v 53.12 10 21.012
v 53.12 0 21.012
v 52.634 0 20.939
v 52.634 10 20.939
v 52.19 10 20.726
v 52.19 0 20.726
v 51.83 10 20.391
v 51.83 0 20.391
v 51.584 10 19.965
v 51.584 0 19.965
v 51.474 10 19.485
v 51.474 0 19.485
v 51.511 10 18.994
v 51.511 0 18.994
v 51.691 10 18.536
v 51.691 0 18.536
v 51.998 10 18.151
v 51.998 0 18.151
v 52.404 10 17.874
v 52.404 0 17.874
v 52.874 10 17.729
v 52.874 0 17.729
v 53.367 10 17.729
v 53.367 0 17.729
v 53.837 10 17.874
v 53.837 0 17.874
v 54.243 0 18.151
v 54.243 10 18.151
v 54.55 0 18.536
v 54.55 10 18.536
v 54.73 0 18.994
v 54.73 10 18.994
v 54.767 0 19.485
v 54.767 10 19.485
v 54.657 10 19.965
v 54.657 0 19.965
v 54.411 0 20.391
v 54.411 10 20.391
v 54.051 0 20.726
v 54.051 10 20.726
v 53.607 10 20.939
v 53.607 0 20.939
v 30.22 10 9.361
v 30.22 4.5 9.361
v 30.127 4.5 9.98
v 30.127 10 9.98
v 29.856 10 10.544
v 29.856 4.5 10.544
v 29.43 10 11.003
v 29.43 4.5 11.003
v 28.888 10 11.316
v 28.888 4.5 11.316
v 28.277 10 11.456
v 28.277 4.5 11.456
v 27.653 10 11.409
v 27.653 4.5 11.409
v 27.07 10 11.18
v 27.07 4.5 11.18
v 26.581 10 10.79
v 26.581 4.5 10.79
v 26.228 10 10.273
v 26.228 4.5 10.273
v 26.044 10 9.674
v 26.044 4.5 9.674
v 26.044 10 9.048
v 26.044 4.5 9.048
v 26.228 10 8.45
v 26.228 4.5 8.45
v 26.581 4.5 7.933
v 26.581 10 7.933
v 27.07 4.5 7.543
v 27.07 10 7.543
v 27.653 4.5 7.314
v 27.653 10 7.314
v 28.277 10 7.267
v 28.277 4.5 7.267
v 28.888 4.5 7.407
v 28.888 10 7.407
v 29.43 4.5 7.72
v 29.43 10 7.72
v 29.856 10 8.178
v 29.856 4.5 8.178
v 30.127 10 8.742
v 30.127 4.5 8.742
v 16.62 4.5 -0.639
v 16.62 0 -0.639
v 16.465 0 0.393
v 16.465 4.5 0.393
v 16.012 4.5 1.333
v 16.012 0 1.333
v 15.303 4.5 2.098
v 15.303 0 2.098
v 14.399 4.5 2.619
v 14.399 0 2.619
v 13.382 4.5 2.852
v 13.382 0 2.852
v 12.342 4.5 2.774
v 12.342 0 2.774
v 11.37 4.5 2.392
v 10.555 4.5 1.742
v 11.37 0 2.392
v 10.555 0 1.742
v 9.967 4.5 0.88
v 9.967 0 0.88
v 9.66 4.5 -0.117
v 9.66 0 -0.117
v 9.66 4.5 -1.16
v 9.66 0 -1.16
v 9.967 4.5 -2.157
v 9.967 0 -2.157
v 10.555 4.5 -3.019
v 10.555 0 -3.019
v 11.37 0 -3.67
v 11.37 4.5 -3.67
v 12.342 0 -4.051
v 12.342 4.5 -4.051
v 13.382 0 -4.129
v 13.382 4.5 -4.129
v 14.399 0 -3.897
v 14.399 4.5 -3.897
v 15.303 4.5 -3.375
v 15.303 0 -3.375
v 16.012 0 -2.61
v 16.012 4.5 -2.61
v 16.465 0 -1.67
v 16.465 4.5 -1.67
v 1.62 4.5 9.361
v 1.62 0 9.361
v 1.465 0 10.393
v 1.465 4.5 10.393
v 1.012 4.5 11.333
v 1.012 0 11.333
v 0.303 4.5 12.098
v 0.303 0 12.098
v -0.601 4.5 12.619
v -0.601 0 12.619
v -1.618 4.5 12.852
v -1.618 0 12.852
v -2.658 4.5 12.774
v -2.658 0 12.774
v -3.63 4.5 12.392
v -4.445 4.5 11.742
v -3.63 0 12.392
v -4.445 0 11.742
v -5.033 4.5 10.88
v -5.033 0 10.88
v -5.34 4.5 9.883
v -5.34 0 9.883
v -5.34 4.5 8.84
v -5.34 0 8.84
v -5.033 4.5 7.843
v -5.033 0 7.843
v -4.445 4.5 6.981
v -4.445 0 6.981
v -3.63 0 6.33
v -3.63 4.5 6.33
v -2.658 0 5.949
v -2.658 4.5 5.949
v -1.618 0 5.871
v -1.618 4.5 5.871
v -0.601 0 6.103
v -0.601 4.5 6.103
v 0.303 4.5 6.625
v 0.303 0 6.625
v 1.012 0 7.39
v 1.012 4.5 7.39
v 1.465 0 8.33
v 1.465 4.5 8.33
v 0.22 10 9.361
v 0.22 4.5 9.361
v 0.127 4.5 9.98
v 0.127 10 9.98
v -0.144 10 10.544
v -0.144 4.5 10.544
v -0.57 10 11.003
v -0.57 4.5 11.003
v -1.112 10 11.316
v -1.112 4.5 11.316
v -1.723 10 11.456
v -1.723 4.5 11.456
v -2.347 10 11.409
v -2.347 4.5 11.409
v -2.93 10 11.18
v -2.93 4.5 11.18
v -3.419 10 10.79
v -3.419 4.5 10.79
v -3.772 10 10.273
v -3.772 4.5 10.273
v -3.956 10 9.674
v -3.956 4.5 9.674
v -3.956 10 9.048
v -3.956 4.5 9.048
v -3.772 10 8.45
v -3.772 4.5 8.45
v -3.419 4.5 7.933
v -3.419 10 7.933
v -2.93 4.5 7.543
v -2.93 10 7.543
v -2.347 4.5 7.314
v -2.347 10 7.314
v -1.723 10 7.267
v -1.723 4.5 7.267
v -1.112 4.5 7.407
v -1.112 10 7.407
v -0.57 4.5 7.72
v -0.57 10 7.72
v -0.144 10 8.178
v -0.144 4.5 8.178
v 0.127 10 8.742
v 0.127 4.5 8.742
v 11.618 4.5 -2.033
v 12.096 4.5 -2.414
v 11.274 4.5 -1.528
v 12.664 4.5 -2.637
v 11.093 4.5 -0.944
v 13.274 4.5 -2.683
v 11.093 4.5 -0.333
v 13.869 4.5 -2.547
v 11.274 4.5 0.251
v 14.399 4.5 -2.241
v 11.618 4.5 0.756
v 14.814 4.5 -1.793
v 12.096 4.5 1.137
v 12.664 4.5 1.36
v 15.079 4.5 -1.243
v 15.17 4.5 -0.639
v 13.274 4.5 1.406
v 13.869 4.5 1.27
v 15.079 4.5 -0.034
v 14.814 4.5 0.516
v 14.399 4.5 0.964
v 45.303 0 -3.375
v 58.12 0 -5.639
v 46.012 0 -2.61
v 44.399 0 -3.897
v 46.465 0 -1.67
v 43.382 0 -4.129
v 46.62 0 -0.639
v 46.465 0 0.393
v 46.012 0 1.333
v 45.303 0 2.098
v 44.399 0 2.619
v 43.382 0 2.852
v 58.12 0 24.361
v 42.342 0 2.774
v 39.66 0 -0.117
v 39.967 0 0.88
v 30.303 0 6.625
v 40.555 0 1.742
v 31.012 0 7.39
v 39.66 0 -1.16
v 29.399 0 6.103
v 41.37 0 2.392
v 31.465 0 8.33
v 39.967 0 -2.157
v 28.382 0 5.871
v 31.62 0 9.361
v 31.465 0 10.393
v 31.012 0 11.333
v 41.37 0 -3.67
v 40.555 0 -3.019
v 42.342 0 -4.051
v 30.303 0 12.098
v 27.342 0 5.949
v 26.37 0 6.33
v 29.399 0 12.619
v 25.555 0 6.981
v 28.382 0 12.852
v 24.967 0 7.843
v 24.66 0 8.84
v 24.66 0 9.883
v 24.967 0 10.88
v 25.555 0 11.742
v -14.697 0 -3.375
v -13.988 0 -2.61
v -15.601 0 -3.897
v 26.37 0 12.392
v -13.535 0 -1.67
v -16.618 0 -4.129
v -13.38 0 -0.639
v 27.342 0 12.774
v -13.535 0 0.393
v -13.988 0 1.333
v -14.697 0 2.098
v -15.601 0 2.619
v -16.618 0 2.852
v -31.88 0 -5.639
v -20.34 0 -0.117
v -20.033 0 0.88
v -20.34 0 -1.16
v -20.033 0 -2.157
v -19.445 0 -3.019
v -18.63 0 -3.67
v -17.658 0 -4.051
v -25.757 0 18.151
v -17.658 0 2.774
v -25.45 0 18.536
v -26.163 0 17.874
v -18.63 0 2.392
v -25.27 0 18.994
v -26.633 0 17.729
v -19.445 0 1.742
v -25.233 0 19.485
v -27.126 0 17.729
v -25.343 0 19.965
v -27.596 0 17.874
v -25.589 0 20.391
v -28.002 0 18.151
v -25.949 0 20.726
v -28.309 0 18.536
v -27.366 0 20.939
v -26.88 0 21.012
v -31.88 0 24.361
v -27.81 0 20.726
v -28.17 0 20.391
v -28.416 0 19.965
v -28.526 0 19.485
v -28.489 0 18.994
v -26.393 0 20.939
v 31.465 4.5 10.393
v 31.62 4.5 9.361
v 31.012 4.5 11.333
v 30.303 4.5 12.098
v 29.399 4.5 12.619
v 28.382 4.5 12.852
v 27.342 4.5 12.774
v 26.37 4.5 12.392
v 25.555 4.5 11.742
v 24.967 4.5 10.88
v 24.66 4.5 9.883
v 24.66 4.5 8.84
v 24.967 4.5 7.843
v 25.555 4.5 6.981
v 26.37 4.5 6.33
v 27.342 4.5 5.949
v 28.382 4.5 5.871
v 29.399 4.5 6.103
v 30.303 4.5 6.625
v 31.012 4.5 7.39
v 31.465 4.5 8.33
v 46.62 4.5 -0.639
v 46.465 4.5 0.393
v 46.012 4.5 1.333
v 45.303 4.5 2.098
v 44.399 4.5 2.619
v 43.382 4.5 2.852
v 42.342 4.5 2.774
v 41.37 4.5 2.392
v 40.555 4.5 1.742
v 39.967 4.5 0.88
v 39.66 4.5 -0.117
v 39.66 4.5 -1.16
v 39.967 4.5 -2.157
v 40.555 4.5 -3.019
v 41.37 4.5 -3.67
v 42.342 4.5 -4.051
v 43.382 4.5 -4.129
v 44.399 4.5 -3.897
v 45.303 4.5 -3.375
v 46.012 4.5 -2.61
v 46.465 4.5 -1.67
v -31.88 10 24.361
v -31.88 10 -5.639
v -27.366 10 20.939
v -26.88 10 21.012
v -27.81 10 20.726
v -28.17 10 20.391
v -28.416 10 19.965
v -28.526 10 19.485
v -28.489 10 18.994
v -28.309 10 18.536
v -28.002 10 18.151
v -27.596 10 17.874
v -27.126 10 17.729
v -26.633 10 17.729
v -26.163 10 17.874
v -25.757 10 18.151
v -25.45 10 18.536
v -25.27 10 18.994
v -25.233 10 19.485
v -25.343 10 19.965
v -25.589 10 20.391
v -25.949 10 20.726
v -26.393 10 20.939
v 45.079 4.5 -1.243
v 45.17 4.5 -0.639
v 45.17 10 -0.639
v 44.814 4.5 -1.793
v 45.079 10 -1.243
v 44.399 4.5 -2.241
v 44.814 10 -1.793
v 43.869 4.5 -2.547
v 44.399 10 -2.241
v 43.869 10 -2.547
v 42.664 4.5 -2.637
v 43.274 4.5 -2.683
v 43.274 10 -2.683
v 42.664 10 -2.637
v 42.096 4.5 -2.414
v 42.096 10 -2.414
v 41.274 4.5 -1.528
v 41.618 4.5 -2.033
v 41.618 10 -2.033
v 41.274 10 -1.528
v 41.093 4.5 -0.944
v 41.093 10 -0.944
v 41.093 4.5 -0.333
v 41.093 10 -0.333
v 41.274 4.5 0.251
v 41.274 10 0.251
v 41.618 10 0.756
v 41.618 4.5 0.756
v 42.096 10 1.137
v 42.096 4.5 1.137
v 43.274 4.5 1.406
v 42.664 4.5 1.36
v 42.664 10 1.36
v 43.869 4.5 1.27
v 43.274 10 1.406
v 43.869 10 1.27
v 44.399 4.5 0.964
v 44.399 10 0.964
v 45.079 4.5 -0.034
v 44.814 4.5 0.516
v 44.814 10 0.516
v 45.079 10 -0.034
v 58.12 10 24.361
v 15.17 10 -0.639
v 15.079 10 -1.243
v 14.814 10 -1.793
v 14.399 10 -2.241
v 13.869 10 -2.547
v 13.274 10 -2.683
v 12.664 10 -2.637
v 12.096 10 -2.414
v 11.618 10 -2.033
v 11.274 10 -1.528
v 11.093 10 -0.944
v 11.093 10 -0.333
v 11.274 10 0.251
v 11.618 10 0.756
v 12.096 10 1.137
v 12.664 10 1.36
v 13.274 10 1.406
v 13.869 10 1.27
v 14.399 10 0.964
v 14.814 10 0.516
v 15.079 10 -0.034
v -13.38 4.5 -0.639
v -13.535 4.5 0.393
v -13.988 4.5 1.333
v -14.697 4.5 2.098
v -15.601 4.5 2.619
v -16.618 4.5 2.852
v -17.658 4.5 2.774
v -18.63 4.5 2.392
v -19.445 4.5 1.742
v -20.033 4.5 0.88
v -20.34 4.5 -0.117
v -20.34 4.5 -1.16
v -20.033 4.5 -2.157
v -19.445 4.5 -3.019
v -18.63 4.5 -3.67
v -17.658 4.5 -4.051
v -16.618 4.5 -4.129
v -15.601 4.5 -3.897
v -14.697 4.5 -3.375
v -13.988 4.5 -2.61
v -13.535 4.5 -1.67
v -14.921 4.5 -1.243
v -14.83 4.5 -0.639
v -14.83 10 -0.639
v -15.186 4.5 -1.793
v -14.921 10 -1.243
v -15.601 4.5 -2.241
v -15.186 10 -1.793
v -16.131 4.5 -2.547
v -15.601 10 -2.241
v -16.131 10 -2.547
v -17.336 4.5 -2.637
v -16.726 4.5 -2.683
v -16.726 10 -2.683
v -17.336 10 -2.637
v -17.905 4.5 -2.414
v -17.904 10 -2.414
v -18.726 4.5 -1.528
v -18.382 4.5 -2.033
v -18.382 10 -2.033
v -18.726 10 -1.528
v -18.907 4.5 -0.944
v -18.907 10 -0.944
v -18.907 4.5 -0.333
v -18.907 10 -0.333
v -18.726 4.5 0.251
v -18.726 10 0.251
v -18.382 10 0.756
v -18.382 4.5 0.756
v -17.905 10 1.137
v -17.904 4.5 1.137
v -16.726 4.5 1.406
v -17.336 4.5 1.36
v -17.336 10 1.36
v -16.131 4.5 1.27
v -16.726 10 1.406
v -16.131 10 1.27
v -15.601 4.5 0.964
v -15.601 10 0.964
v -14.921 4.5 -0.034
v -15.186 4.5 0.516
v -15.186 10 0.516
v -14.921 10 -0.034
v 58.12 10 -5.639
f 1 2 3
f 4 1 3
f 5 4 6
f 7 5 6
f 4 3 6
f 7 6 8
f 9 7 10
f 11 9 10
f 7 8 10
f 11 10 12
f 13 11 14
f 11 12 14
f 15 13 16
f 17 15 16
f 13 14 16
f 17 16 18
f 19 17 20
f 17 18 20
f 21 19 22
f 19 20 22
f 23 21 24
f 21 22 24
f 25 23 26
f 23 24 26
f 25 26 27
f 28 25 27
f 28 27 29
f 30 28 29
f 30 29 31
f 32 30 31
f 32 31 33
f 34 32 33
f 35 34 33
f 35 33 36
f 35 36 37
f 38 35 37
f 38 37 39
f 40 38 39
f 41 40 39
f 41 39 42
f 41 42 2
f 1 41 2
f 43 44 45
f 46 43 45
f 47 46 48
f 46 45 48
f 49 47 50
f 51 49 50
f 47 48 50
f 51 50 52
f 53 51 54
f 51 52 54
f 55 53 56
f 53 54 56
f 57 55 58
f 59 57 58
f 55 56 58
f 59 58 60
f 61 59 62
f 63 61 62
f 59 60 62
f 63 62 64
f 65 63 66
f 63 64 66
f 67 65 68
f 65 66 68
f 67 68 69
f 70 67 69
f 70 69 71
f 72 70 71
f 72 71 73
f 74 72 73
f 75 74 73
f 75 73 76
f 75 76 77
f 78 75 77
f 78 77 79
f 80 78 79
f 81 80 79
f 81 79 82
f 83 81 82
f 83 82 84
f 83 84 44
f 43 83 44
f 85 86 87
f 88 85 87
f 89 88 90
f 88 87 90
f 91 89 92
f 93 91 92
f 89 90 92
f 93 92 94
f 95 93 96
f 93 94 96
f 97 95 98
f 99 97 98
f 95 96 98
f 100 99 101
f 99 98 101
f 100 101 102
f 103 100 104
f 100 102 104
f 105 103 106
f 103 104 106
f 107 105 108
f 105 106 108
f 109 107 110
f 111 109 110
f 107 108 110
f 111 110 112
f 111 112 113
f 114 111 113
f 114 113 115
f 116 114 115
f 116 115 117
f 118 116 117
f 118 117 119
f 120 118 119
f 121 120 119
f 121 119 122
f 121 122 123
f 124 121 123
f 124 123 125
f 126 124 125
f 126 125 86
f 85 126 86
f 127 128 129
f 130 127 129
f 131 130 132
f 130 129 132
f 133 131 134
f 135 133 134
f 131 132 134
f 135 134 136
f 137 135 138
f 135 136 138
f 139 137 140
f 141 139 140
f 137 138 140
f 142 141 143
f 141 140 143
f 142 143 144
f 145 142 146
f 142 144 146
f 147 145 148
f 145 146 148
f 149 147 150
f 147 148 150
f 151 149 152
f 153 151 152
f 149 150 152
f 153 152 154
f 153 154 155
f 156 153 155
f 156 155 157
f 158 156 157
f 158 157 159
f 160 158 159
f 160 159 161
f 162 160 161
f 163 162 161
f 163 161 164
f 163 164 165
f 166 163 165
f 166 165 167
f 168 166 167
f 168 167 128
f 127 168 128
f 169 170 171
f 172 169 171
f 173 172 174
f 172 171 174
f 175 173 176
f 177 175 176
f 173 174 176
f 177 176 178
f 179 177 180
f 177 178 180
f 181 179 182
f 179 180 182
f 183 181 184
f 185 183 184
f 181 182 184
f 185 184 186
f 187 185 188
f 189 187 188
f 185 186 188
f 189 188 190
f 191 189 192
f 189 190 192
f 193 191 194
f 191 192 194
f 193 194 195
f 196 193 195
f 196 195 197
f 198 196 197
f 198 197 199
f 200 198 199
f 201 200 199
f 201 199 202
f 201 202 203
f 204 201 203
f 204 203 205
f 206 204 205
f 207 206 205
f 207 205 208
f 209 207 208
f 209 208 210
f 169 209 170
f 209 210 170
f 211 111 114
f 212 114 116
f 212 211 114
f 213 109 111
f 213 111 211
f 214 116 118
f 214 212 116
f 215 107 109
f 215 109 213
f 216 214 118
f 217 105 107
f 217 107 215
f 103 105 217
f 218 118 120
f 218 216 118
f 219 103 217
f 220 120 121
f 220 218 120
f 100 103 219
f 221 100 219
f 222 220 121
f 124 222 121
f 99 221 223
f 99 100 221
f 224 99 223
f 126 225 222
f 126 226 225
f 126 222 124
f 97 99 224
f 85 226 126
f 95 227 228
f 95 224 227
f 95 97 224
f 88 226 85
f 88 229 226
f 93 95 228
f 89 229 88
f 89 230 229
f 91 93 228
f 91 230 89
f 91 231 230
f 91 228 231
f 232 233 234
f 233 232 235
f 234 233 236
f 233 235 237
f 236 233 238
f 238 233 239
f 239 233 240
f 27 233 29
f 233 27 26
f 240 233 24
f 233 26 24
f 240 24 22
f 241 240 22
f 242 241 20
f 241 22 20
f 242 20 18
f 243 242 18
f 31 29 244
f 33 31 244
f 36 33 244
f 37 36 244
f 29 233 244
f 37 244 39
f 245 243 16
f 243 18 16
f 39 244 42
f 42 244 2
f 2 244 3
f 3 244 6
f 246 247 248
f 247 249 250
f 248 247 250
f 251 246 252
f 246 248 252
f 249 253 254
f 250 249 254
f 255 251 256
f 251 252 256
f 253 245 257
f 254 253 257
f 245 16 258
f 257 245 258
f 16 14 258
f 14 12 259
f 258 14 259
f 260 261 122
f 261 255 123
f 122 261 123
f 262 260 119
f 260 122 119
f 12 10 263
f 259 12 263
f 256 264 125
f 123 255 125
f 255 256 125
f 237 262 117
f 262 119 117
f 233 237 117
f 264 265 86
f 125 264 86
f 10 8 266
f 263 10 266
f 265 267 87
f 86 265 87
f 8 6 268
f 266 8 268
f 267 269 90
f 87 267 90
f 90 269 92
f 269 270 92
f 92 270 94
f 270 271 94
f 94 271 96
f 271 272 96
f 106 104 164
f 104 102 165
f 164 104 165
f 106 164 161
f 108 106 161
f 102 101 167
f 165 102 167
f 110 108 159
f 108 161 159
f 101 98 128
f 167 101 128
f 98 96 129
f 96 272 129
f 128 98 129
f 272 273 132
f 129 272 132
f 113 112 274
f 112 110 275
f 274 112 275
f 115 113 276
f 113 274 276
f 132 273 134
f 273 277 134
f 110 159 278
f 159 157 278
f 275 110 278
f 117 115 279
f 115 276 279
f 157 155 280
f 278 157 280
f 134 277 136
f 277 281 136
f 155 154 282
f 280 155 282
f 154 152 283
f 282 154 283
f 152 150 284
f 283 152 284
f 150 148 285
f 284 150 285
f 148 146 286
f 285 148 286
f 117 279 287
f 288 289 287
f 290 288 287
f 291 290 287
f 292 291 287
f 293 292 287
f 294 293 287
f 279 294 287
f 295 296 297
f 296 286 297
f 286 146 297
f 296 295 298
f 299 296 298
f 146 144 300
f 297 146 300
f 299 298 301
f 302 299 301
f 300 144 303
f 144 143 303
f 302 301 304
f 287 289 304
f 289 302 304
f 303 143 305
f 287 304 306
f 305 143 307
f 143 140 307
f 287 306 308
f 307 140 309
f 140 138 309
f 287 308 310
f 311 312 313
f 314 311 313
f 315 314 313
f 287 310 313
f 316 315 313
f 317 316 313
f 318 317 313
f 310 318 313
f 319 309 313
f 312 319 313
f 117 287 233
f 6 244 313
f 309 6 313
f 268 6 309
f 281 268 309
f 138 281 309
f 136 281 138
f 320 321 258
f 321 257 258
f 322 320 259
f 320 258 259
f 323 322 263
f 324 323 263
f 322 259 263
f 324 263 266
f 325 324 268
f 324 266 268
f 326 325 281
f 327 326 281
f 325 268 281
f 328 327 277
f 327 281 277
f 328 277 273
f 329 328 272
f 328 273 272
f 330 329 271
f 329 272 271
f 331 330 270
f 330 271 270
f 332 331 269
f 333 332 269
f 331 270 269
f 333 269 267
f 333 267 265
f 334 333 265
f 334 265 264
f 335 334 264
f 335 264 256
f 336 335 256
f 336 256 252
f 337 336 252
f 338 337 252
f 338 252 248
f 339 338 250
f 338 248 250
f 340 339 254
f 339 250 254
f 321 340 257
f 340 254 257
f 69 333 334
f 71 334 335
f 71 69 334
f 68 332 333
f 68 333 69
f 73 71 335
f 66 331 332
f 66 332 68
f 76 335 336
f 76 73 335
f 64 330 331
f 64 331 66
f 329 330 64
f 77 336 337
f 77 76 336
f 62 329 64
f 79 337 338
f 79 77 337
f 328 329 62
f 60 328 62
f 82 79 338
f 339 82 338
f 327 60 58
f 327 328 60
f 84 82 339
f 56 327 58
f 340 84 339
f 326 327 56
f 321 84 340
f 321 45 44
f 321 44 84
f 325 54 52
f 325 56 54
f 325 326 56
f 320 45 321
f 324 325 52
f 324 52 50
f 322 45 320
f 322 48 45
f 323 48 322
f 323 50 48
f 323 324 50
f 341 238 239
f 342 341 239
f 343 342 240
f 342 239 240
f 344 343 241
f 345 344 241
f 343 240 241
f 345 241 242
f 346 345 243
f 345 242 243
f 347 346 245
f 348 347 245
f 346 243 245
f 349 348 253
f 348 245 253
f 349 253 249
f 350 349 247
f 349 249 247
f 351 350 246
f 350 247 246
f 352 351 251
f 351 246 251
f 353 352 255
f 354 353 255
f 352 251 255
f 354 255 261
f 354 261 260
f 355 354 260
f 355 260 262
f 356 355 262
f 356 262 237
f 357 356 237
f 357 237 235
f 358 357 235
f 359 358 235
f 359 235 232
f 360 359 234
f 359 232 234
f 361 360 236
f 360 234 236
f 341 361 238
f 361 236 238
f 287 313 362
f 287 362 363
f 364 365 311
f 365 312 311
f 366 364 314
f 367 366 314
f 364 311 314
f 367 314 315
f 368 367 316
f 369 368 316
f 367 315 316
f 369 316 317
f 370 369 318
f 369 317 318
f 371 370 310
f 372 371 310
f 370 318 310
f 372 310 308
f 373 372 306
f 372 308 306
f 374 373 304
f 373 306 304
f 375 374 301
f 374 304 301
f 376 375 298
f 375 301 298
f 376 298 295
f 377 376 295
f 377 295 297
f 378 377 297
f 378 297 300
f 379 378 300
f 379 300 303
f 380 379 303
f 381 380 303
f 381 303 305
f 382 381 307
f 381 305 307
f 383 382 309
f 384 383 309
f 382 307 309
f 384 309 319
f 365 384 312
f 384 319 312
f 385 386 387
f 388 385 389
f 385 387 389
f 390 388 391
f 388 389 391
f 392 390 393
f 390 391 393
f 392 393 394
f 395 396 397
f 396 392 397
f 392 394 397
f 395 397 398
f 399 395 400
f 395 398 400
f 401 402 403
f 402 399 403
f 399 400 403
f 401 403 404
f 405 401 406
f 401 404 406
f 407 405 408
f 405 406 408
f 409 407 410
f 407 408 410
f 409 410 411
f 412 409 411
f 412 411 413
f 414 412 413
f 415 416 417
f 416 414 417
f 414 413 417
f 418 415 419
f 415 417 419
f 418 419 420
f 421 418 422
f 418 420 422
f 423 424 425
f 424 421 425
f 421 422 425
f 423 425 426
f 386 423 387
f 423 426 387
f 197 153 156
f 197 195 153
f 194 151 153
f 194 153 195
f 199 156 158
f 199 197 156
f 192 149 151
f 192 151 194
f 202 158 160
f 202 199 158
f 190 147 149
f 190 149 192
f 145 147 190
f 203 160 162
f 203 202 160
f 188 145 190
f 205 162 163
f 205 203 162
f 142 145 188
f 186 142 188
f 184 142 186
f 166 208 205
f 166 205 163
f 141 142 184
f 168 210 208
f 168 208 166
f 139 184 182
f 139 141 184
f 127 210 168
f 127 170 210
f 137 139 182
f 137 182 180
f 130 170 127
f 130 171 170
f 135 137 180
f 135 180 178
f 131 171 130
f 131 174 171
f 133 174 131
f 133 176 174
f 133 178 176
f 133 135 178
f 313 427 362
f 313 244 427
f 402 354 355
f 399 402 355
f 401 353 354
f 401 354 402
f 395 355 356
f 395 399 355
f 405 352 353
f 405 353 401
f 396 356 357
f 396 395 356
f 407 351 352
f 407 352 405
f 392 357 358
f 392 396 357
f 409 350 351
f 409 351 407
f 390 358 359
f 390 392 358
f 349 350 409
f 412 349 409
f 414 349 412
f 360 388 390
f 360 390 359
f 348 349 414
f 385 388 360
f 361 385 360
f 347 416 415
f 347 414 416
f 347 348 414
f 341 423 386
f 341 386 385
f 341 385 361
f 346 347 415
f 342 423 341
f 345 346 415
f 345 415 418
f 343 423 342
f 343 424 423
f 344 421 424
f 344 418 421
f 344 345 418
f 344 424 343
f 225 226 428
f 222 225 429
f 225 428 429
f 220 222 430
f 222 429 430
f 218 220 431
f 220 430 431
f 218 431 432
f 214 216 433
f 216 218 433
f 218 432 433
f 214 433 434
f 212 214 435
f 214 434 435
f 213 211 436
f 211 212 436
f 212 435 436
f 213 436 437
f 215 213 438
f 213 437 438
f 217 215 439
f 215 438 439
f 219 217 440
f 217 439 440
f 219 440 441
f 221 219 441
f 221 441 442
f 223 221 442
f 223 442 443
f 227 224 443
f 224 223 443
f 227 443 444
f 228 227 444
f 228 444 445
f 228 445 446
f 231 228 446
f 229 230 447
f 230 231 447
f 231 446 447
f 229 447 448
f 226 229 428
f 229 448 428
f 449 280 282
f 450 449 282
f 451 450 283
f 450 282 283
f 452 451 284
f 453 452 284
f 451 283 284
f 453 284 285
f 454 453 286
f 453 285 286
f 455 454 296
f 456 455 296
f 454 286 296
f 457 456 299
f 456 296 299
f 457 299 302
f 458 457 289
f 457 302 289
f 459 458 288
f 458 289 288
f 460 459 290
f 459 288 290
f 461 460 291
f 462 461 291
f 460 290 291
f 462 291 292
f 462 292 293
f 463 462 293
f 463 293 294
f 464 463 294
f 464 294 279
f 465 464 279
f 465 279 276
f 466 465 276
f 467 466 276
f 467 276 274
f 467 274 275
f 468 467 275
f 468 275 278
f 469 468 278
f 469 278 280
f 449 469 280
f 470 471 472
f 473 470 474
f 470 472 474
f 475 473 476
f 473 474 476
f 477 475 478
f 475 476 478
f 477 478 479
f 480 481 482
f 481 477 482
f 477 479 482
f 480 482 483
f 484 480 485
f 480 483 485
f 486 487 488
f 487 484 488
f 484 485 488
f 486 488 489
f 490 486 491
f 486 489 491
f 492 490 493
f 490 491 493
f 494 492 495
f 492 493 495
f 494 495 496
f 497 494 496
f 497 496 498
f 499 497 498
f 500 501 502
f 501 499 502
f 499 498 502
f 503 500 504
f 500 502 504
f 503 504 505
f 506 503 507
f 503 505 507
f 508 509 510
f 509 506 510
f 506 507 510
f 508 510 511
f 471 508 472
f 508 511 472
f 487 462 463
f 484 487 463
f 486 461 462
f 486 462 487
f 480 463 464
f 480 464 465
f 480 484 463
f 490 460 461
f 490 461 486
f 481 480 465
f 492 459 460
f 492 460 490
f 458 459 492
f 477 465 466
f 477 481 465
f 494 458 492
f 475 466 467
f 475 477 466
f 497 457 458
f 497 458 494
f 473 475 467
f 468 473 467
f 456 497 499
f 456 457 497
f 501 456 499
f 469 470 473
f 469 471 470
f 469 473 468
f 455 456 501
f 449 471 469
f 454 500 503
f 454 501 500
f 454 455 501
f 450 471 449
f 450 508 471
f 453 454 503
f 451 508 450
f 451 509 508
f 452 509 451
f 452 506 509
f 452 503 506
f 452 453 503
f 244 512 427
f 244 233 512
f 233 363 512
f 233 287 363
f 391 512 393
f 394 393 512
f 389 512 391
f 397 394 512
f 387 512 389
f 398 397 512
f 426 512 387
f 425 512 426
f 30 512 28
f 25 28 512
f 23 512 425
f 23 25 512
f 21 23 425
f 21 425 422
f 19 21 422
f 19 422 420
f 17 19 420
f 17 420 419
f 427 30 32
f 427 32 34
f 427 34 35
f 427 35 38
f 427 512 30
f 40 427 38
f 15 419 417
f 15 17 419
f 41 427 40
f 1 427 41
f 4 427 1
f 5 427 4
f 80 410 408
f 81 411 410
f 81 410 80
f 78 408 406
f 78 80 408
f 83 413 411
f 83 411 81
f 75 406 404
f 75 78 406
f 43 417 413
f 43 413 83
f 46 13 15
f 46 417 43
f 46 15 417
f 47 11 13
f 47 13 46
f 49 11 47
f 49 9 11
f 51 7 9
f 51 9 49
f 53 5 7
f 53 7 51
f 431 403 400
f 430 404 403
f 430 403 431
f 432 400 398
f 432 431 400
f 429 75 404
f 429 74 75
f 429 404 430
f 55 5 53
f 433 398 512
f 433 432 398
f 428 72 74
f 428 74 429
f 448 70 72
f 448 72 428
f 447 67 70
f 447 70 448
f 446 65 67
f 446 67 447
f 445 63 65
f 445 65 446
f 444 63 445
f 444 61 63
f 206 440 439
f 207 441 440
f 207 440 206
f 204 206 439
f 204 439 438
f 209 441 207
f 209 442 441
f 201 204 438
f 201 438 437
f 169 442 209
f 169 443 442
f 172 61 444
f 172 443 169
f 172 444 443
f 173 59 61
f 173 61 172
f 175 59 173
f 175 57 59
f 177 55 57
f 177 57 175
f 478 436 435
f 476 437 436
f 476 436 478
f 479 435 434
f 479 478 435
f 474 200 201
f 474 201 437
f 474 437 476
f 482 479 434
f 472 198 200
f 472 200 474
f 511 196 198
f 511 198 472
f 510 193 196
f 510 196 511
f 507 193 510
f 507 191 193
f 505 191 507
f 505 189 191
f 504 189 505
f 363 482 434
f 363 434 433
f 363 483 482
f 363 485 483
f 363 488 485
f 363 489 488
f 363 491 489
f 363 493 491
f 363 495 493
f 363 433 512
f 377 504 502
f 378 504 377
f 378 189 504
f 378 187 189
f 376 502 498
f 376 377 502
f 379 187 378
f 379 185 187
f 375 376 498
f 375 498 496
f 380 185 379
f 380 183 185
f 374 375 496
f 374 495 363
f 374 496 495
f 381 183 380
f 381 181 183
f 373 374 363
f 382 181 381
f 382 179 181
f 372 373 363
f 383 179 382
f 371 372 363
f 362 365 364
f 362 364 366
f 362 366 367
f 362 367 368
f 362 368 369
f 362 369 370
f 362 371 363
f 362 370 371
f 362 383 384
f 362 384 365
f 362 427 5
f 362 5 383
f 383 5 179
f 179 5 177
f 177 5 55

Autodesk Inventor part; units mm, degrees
ref_plane "YZ Plane" through (0, 0, 0) normal (1, 0, 0) x (0, 1, 0)
ref_plane "XZ Plane" through (0, 0, 0) normal (0, 1, 0) x (-1, 0, 0)
ref_plane "XY Plane" through (0, 0, 0) normal (0, 0, 1) x (1, 0, 0)
sketch "Sketch1" plane through (0, 0, 0) normal (0, 1, 0) x (-1, 0, 0)
  line L0 (31.8795, -5.6386) -> (-58.1205, -5.6386)
  line L1 (-58.1205, -5.6386) -> (-58.1205, 24.3614)
  line L2 (-58.1205, 24.3614) -> (31.8795, 24.3614)
  line L3 (31.8795, 24.3614) -> (31.8795, -5.6386)
  point P0 (0, 0)
  dimension "d0" = 90
  dimension "d5" = 30
extrude "Extrusion1" add sketch "Sketch1" along normal blind 10
sketch "Sketch2" plane through (0, 10, 0) normal (0, 1, 0) x (1, 0, 0)
  line L0 (58.1205, 5.6386) -> (-31.8795, 5.6386) projected
  line L1 (-31.8795, 5.6386) -> (-31.8795, -24.3614) projected
  circle A0 centre (-16.8795, 0.6386) radius 2.05
  circle A1 centre (13.1205, 0.6386) radius 2.05
  circle A2 centre (43.1205, 0.6386) radius 2.05
  point P0 (0, 0)
  dimension "d8" = 4.1
  dimension "d10" = 4.1
  dimension "d11" = 4.1
  dimension "d12" = 5
  dimension "d13" = 5
  dimension "d14" = 5
  dimension "d15" = 15
  dimension "d16" = 30
  dimension "d17" = 30
extrude "Extrusion2" cut sketch "Sketch2" against normal blind 10
sketch "Sketch4" plane through (0, 0, 0) normal (0, -1, 0) x (1, 0, 0)
  circle A0 centre (13.1205, -0.6386) radius 2.05 projected
  circle A1 centre (-16.8795, -0.6386) radius 2.05 projected
  circle A2 centre (43.1205, -0.6386) radius 2.05 projected
  circle A3 centre (-16.8795, -0.6386) radius 3.5
  circle A4 centre (13.1205, -0.6386) radius 3.5
  circle A5 centre (43.1205, -0.6386) radius 3.5
  point P0 (0, 0)
  dimension "d26" = 7
  dimension "d28" = 7
  dimension "d29" = 7
extrude "Extrusion4" cut sketch "Sketch4" against normal blind 4.5
sketch "Sketch5" plane through (0, 0, 0) normal (0, -1, 0) x (1, 0, 0)
  line L0 (58.1205, -5.6386) -> (58.1205, 24.3614) projected
  line L1 (58.1205, 24.3614) -> (-31.8795, 24.3614) projected
  line L2 (-31.8795, 24.3614) -> (-31.8795, -5.6386) projected
  circle A0 centre (-1.8795, 9.3614) radius 2.1
  circle A1 centre (28.1205, 9.3614) radius 2.1
  point P0 (0, 0)
  dimension "d32" = 4.2
  dimension "d34" = 4.2
  dimension "d35" = 30
  dimension "d36" = 30
  dimension "d37" = 15
  dimension "d38" = 15
extrude "Extrusion5" cut sketch "Sketch5" against normal blind 10
sketch "Sketch6" plane through (0, 0, 0) normal (0, -1, 0) x (1, 0, 0)
  circle A0 centre (-1.8795, 9.3614) radius 2.1 projected
  circle A1 centre (28.1205, 9.3614) radius 2.1 projected
  circle A2 centre (-1.8795, 9.3614) radius 3.5
  circle A3 centre (28.1205, 9.3614) radius 3.5
  point P0 (0, 0)
  dimension "d41" = 7
  dimension "d43" = 7
extrude "Extrusion6" cut sketch "Sketch6" against normal blind 4.5
sketch "Sketch8" plane through (0, 10, 0) normal (0, 1, 0) x (1, 0, 0)
  line L0 (-31.8795, 5.6386) -> (-31.8795, -24.3614) projected
  line L1 (-31.8795, -24.3614) -> (-26.8795, -24.3614)
  line L2 (-26.8795, -24.3614) -> (-26.8795, -19.3614)
  line L3 (-26.8795, -19.3614) -> (-31.8795, -19.3614)
  line L4 (-31.8795, -19.3614) -> (-31.8795, -24.3614)
  line L5 (-31.8795, -24.3614) -> (58.1205, -24.3614) projected
  line L6 (58.1205, -24.3614) -> (53.1205, -24.3614)
  line L7 (53.1205, -24.3614) -> (53.1205, -19.3614)
  line L8 (53.1205, -19.3614) -> (58.1205, -19.3614)
  line L9 (58.1205, -19.3614) -> (58.1205, -24.3614)
  point P0 (0, 0)
  dimension "d58" = 5
  dimension "d59" = 5
  dimension "d62" = 5
  dimension "d63" = 5
hole "Hole1" at (-26.8795, 10, 19.3614) at (53.1205, 10, 19.3614) direction (0, -1, 0) diameter 3.302 depth 12.3 thread size "8-32 UNC" class "2B" standard "ANSI Unified Screw Threads"
equation "\"d10\" = d8"
equation "\"d11\" = d8"
equation "\"d13\" = d12"
equation "\"d14\" = d12"
equation "\"d28\" = d26"
equation "\"d29\" = d26"
properties part number "AgarMouldBottomV3"
